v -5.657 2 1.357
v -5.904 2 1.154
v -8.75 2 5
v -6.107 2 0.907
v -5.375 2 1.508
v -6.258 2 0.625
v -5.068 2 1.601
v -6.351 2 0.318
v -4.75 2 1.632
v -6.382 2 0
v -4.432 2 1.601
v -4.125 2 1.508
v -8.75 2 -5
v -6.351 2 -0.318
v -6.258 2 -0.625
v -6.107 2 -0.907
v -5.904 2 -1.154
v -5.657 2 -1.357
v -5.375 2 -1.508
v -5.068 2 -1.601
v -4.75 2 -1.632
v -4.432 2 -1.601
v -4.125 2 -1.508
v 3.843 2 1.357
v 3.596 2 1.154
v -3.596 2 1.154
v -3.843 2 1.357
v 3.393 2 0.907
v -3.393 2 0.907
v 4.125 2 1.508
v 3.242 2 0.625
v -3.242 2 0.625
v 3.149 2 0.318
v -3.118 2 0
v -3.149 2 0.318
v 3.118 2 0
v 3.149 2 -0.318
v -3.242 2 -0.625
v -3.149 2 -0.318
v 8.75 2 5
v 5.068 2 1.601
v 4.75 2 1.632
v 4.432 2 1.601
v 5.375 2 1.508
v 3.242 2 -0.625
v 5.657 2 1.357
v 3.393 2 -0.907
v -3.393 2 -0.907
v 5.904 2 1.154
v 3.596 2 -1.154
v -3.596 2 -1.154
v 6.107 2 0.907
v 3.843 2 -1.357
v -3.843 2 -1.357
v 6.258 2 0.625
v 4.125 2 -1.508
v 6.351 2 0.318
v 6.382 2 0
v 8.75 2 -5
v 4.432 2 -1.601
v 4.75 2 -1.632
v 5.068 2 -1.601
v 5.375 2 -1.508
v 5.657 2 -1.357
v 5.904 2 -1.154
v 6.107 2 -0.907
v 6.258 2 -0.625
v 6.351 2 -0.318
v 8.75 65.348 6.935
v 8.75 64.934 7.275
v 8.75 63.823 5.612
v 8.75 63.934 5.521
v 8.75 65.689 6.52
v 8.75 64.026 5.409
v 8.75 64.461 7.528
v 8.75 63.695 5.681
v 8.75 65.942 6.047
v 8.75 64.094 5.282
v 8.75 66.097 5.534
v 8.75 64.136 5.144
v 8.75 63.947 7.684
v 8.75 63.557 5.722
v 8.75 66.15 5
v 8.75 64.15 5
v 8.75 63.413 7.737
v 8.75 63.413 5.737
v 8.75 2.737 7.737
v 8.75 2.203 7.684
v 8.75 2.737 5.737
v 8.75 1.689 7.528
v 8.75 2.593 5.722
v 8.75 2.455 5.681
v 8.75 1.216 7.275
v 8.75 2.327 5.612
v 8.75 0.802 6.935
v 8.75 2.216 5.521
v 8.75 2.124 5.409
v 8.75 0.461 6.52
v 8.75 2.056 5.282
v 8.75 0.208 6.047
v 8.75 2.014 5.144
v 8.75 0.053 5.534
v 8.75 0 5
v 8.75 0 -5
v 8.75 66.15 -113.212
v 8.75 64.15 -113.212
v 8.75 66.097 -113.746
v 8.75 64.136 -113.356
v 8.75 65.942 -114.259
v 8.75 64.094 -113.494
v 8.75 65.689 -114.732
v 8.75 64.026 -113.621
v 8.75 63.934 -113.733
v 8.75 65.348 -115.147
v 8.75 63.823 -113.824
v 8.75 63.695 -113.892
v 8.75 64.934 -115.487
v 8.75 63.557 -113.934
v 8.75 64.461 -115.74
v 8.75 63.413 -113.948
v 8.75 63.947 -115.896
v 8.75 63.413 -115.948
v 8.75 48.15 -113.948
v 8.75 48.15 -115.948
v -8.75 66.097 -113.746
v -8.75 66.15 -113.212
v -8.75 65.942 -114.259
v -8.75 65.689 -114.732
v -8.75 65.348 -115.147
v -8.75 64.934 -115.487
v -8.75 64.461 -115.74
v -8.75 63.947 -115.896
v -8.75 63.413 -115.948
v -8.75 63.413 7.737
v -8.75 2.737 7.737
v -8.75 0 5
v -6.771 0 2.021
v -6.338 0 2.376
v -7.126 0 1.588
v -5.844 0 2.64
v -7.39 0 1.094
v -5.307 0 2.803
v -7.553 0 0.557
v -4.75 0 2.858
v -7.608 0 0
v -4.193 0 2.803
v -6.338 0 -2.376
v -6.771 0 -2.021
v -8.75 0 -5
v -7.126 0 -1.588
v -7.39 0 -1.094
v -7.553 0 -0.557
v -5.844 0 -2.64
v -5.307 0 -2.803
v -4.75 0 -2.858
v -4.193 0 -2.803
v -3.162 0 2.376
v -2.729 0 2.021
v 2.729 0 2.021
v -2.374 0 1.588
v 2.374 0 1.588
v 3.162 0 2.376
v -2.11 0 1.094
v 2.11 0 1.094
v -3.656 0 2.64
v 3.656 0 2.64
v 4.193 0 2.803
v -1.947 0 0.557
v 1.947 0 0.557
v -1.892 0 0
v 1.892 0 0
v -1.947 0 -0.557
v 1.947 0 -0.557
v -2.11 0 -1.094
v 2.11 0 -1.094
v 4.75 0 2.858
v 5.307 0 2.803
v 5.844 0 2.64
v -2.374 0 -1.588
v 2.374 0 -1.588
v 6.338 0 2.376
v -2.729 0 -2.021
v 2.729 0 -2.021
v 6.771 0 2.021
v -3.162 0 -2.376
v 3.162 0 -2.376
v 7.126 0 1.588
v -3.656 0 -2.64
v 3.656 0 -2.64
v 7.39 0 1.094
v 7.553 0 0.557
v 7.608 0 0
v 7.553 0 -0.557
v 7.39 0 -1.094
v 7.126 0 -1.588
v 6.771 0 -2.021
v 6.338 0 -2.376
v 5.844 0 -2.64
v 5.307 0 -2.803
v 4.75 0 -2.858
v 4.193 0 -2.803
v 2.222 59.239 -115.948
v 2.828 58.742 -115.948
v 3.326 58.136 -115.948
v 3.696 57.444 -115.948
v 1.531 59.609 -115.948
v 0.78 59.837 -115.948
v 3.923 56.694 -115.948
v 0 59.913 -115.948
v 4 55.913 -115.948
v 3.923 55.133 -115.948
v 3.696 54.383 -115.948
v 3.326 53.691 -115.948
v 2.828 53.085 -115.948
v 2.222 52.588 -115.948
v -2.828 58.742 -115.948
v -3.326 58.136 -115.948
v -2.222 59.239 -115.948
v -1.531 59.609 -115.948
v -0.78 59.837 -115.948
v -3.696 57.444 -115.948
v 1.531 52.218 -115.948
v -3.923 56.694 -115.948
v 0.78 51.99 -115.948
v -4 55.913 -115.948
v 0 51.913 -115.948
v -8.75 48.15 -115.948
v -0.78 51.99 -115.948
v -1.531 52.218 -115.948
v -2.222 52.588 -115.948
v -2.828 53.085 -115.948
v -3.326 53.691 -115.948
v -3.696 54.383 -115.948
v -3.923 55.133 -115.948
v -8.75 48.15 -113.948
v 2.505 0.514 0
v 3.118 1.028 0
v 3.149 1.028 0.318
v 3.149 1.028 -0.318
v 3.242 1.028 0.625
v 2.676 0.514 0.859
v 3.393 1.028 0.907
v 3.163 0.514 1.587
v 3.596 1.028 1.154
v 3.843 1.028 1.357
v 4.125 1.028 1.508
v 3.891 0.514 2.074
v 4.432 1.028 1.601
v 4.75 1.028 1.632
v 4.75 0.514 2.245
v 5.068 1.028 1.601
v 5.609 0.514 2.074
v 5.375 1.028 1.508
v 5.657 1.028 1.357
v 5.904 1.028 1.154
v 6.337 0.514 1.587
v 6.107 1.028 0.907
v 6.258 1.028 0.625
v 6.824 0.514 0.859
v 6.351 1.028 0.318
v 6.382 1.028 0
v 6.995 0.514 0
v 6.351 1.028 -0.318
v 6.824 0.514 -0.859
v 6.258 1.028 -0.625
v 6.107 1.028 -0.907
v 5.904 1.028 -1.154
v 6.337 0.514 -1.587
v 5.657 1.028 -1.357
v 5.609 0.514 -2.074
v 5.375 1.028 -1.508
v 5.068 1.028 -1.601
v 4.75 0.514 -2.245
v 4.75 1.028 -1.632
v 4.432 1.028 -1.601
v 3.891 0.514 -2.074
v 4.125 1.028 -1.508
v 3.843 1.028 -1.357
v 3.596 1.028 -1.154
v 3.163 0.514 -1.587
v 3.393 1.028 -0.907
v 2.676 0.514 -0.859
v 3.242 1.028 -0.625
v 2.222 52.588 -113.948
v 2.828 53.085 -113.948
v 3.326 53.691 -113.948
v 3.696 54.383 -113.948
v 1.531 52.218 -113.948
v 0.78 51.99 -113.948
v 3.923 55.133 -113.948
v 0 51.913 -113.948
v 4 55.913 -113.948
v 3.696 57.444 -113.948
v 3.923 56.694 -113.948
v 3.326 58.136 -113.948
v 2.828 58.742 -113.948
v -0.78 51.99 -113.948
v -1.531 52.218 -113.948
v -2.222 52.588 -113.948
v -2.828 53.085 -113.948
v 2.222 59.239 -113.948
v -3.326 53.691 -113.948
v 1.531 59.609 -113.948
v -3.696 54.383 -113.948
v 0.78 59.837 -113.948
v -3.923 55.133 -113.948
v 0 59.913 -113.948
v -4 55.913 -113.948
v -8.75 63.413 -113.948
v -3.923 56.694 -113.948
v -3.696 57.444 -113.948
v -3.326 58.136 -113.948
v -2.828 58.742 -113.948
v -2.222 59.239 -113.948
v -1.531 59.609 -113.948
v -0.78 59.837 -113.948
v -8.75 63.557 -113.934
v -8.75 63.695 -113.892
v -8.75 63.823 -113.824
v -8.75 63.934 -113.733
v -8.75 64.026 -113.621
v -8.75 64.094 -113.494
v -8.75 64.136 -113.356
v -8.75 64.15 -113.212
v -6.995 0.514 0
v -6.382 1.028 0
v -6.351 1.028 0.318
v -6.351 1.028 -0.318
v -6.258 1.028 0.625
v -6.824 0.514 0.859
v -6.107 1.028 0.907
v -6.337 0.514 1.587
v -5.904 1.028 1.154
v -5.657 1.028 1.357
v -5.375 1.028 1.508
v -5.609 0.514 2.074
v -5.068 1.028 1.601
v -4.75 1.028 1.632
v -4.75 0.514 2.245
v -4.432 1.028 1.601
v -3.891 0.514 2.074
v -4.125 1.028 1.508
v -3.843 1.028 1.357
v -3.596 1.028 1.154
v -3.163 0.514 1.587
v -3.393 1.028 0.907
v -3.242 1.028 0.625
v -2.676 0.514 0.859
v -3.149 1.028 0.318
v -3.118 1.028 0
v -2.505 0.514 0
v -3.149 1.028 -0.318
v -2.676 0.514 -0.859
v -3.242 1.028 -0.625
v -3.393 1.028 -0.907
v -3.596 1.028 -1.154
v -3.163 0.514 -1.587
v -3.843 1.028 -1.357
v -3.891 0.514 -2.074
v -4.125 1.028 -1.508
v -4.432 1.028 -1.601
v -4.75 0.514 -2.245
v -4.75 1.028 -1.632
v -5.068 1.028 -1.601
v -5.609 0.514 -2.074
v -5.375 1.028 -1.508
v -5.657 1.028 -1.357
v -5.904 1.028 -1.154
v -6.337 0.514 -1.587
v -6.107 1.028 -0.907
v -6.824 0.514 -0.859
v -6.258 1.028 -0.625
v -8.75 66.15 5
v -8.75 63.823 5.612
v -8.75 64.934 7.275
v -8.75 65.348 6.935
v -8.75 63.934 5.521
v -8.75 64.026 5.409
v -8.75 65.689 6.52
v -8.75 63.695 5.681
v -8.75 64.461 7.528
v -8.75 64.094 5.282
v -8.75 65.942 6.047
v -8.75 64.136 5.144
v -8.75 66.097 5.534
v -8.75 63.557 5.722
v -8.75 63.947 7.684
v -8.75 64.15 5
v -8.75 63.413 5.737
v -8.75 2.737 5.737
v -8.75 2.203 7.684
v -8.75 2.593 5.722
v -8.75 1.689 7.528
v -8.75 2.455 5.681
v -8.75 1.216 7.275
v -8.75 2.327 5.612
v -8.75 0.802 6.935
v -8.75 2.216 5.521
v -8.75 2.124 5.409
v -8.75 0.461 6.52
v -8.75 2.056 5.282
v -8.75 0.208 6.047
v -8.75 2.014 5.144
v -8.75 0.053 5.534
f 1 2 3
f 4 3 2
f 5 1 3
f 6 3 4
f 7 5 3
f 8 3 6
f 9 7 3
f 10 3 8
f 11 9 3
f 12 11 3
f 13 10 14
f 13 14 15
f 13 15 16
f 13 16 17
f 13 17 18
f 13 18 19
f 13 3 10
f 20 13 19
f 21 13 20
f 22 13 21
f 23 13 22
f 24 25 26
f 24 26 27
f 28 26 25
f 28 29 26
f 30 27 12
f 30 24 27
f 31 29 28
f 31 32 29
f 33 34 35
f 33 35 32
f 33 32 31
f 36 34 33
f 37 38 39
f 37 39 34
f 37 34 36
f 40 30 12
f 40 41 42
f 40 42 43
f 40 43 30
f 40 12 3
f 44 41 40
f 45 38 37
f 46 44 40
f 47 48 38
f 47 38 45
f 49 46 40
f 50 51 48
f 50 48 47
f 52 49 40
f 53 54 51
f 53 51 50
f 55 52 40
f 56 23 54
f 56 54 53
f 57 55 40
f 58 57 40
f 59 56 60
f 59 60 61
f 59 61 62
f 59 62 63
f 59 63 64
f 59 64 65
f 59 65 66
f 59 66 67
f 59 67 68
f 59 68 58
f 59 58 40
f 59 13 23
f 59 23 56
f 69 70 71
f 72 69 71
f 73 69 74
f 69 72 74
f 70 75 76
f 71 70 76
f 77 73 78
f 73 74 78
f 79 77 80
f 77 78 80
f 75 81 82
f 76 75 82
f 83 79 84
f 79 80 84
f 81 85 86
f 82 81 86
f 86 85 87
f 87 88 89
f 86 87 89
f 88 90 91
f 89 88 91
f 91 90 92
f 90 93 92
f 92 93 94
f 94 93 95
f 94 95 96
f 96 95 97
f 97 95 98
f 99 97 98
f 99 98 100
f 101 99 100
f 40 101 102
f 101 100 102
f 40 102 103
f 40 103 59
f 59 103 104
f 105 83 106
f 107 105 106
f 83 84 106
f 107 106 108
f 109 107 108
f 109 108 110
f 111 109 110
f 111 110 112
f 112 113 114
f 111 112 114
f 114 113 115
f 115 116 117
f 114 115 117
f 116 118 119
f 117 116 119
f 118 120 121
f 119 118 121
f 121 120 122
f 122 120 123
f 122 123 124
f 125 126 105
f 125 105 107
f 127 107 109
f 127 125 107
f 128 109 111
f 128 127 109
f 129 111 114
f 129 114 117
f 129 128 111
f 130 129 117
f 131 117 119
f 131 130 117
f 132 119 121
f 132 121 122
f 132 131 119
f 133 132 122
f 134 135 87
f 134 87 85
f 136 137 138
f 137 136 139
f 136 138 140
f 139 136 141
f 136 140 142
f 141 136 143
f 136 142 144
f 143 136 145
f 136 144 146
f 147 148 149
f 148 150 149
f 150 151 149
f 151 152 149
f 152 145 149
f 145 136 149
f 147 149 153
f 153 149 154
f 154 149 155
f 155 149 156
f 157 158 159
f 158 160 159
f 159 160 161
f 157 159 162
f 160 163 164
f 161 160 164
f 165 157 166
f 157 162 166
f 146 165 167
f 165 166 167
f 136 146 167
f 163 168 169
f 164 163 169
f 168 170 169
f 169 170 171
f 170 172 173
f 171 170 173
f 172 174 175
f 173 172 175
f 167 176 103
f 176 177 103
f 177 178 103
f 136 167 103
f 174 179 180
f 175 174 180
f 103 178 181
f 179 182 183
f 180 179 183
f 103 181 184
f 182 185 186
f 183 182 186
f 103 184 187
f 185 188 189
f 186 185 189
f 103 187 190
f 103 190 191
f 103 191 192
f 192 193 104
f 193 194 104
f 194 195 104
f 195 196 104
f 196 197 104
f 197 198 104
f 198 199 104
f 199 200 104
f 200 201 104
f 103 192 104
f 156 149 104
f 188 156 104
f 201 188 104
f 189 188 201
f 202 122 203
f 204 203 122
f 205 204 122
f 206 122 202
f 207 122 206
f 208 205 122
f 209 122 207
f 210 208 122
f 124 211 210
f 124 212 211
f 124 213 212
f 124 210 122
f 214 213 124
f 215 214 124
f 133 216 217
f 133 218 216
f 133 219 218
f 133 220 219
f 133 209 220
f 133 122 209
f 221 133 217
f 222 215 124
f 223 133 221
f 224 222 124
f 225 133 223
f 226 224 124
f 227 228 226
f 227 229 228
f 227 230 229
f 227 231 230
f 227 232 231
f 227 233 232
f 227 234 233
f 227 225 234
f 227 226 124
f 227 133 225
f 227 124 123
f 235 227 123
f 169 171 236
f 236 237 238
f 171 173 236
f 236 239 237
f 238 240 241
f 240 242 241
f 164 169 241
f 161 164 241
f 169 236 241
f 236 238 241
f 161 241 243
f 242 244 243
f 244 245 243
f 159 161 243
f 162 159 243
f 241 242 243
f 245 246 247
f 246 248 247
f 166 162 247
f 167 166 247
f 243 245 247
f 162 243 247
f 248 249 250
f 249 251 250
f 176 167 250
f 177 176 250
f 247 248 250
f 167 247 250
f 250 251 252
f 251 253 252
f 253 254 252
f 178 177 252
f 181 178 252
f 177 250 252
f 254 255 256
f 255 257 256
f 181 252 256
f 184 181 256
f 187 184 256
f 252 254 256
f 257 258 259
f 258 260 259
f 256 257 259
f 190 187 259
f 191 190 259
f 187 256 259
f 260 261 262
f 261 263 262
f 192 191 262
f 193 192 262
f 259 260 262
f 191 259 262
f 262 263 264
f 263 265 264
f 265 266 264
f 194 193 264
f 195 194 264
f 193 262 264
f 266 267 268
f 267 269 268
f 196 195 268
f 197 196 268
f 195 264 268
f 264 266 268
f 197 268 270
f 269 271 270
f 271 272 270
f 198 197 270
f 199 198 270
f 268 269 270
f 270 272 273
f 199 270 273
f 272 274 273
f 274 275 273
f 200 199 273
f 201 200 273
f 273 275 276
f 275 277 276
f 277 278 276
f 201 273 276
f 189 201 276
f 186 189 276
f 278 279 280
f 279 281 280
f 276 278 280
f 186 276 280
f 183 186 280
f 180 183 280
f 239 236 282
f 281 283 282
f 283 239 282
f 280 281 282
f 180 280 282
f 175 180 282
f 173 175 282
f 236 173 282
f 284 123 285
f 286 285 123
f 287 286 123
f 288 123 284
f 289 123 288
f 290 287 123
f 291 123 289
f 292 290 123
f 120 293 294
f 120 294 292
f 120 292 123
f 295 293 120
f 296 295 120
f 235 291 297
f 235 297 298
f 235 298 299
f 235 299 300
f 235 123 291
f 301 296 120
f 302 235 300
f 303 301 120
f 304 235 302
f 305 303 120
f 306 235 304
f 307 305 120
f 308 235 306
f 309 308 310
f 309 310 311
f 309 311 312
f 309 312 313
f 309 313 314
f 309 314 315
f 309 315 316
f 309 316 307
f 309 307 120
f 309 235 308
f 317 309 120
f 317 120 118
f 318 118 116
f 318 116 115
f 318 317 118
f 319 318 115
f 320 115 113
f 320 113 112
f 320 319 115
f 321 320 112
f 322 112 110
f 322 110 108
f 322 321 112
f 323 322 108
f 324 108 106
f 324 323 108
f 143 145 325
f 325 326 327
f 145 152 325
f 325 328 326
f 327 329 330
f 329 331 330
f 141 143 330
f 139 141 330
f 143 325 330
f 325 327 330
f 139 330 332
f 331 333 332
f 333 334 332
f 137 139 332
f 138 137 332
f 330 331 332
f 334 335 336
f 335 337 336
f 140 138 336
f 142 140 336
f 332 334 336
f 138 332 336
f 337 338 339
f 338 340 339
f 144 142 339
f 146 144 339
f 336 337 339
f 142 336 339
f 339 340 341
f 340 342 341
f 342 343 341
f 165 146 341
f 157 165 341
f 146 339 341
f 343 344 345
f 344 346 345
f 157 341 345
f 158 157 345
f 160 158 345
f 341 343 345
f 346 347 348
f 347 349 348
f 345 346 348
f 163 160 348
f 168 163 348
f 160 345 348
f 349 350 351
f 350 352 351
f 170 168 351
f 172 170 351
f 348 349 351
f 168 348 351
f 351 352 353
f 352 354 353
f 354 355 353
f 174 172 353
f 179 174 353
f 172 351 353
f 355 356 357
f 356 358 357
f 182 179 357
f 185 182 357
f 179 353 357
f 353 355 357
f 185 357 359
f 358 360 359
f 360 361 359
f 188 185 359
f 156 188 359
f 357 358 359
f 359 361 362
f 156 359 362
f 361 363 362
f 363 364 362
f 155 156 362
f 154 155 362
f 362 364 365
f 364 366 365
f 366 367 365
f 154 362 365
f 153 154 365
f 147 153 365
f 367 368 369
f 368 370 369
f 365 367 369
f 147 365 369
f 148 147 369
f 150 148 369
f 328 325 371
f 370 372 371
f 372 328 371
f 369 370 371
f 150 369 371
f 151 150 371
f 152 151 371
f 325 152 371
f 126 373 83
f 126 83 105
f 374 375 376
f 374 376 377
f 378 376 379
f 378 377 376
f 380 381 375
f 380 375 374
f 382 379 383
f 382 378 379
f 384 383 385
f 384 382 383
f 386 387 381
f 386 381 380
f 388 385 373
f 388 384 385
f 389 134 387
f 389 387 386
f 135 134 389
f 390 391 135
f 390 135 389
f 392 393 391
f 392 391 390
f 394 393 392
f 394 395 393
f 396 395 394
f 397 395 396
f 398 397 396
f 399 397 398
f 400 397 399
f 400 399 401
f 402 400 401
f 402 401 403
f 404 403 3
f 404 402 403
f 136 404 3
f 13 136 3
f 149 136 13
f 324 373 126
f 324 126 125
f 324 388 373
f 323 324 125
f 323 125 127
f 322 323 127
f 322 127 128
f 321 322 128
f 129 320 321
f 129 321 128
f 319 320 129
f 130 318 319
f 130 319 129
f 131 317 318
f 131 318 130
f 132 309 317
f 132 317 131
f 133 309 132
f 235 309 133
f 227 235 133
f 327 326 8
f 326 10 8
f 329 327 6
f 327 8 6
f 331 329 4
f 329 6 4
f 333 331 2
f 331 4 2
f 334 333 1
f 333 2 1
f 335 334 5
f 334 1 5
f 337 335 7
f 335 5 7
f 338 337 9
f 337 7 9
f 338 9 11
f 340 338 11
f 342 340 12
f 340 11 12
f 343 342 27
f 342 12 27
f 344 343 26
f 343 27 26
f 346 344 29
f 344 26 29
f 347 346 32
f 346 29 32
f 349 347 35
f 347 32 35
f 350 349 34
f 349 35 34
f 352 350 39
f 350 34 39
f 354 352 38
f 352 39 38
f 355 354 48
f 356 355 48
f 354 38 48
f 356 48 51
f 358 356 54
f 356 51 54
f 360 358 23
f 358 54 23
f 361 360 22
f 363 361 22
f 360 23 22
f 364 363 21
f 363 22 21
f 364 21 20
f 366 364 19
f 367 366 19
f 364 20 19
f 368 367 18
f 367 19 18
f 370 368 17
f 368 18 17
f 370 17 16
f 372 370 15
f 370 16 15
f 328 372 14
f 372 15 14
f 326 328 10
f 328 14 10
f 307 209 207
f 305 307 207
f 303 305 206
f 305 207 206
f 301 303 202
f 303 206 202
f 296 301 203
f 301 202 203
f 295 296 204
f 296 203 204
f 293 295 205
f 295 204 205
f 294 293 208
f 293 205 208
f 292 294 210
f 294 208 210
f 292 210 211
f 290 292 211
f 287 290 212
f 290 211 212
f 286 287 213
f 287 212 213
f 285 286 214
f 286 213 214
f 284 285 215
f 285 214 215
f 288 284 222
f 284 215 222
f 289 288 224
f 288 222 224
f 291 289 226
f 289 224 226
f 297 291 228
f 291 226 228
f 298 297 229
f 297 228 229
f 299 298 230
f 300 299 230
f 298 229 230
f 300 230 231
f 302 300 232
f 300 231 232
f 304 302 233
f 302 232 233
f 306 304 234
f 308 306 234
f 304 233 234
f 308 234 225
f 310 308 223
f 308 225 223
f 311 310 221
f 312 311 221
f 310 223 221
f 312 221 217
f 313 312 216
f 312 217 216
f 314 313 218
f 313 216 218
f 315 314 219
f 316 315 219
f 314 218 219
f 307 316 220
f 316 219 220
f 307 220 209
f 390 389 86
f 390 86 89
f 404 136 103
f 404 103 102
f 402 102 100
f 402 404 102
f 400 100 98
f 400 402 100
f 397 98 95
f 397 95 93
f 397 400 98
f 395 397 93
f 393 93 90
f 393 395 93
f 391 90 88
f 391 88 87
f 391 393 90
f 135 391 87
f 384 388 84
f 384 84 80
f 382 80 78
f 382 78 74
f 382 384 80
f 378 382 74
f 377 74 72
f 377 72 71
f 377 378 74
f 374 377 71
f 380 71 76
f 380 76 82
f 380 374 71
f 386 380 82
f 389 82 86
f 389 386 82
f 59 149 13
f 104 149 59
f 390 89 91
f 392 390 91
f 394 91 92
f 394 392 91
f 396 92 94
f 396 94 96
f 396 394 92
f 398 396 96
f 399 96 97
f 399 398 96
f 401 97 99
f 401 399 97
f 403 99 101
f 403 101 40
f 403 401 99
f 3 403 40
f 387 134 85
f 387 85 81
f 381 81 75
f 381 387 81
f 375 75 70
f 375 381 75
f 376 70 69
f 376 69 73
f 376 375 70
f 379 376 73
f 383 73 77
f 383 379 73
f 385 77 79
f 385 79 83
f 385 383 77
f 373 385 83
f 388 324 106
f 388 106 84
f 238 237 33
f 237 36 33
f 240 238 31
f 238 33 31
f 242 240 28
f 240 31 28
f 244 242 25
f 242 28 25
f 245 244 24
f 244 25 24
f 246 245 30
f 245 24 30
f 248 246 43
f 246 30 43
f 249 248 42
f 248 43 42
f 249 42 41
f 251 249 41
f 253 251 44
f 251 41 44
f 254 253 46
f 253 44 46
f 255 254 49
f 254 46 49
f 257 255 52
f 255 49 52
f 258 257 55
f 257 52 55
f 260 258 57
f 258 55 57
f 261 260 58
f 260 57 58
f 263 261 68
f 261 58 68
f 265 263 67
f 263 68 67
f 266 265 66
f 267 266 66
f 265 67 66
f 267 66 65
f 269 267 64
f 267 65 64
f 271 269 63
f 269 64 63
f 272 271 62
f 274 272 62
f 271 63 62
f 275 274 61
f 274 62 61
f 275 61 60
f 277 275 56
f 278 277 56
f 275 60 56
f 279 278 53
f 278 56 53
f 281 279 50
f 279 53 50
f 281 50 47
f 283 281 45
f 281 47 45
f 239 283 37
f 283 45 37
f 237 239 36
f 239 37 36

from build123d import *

# Parameters (mm, degrees)
SKETCH1_W                                         = 17.5
SKETCH1_H                                         = 10
BASE_FLANGE1_DEPTH                                = 2
EDGE_FLANGE1_DEPTH                                = 17.5
EDGE_FLANGE2_STRIP_W                              = 9.4732
EDGE_FLANGE2_STRIP_H                              = 2
EDGE_FLANGE2_STRIP_CUT_DEPTH                      = 17.5
EDGE_FLANGE2_DEPTH                                = 17.5
EDGE_FLANGE3_STRIP_W                              = 9.4732
EDGE_FLANGE3_STRIP_H                              = 2
EDGE_FLANGE3_STRIP_CUT_DEPTH                      = 17.5
EDGE_FLANGE3_DEPTH                                = 17.5
SKETCH18_R                                        = 4
CUT_EXTRUDE2_DEPTH                                = 2
CSK_FOR_4_FLAT_HEAD_MACHINE_SCREW_100_D           = 3.2639
CSK_FOR_4_FLAT_HEAD_MACHINE_SCREW_100_DEPTH       = 2
CSK_FOR_4_FLAT_HEAD_MACHINE_SCREW_100_CSINK_D     = 5.715
CSK_FOR_4_FLAT_HEAD_MACHINE_SCREW_100_CSINK_ANGLE = 100
CSK_FOR_4_FLAT_HEAD_MACHINE_SCREW_100_TIP         = 0.980574487


# Sheet-metal steps are written as plain solids
with BuildPart() as part:
    # Sketch1 → Base-Flange1 (new body)
    with BuildSketch(Plane(origin=(0, 0, 0), x_dir=(1, 0, 0), z_dir=(0, 1, 0))):
        Rectangle(SKETCH1_W, SKETCH1_H)
    extrude(amount=BASE_FLANGE1_DEPTH)

    # Edge-Flange1 section (across the edge) → Edge-Flange1 (add)
    with BuildSketch(Plane(origin=(-8.75, 2, 5.7366), x_dir=(0, 0, -1), z_dir=(1, 0, 0))):
        with BuildLine():
            Line((-2, 0.7366), (-2, 64.15))
            Line((-2, 64.15), (0, 64.15))
            Line((0, 64.15), (0, 0.7366))
            ThreePointArc((0, 0.7366), (0.215745145, 0.215745145), (0.7366, 0))
            Line((0.7366, 0), (0.7366, -2))
            ThreePointArc((0.7366, -2), (-1.198468417, -1.198468417), (-2, 0.7366))
        make_face()
    extrude(amount=EDGE_FLANGE1_DEPTH)

    # Edge-Flange2 strip (across the edge) → Edge-Flange2 strip cut (cut)
    with BuildSketch(Plane(origin=(-8.75, 66.15, 5.7366), x_dir=(0, -1, 0), z_dir=(1, 0, 0))):
        with Locations((-2, -1)):
            Rectangle(EDGE_FLANGE2_STRIP_W, EDGE_FLANGE2_STRIP_H)
    extrude(amount=EDGE_FLANGE2_STRIP_CUT_DEPTH, mode=Mode.SUBTRACT)

    # Edge-Flange2 section (across the edge) → Edge-Flange2 (add)
    with BuildSketch(Plane(origin=(-8.75, 66.15, 5.7366), x_dir=(0, -1, 0), z_dir=(1, 0, 0))):
        with BuildLine():
            Line((0, 0.7366), (0, 121.685))
            Line((0, 121.685), (2, 121.685))
            Line((2, 121.685), (2, 0.7366))
            ThreePointArc((2, 0.7366), (2.215745145, 0.215745145), (2.7366, 0))
            Line((2.7366, 0), (2.7366, -2))
            ThreePointArc((2.7366, -2), (0.801531583, -1.198468417), (0, 0.7366))
        make_face()
    extrude(amount=EDGE_FLANGE2_DEPTH)

    # Edge-Flange3 strip (across the edge) → Edge-Flange3 strip cut (cut)
    with BuildSketch(Plane(origin=(-8.75, 64.15, -115.9484), x_dir=(0, 0, 1), z_dir=(1, 0, 0))):
        with Locations((-2, -1)):
            Rectangle(EDGE_FLANGE3_STRIP_W, EDGE_FLANGE3_STRIP_H)
    extrude(amount=EDGE_FLANGE3_STRIP_CUT_DEPTH, mode=Mode.SUBTRACT)

    # Edge-Flange3 section (across the edge) → Edge-Flange3 (add)
    with BuildSketch(Plane(origin=(-8.75, 64.15, -115.9484), x_dir=(0, 0, 1), z_dir=(1, 0, 0))):
        with BuildLine():
            Line((0, 0.7366), (0, 16))
            Line((0, 16), (2, 16))
            Line((2, 16), (2, 0.7366))
            ThreePointArc((2, 0.7366), (2.215745145, 0.215745145), (2.7366, 0))
            Line((2.7366, 0), (2.7366, -2))
            ThreePointArc((2.7366, -2), (0.801531583, -1.198468417), (0, 0.7366))
        make_face()
    extrude(amount=EDGE_FLANGE3_DEPTH)

    # Sketch18 → Cut-Extrude2 (cut)
    with BuildSketch(Plane(origin=(0, 0, -115.9484), x_dir=(-1, 0, 0), z_dir=(0, 0, -1))):
        with Locations(Location((0, 55.9134, 0), (0, 0, 90))):
            Circle(SKETCH18_R)
    extrude(amount=-CUT_EXTRUDE2_DEPTH, mode=Mode.SUBTRACT)

    # CSK for #4 Flat Head Machine Screw (100)1
    with Locations(Plane.XZ):
        with Locations((4.75, 0), (-4.75, 0)):
            CounterSinkHole(CSK_FOR_4_FLAT_HEAD_MACHINE_SCREW_100_D / 2, CSK_FOR_4_FLAT_HEAD_MACHINE_SCREW_100_CSINK_D / 2, depth=CSK_FOR_4_FLAT_HEAD_MACHINE_SCREW_100_DEPTH, counter_sink_angle=CSK_FOR_4_FLAT_HEAD_MACHINE_SCREW_100_CSINK_ANGLE)
            with Locations((0, 0, -(CSK_FOR_4_FLAT_HEAD_MACHINE_SCREW_100_DEPTH + CSK_FOR_4_FLAT_HEAD_MACHINE_SCREW_100_TIP / 2))):  # 118° drill point
                Cone(0, CSK_FOR_4_FLAT_HEAD_MACHINE_SCREW_100_D / 2, CSK_FOR_4_FLAT_HEAD_MACHINE_SCREW_100_TIP, mode=Mode.SUBTRACT)


solid = part.part
